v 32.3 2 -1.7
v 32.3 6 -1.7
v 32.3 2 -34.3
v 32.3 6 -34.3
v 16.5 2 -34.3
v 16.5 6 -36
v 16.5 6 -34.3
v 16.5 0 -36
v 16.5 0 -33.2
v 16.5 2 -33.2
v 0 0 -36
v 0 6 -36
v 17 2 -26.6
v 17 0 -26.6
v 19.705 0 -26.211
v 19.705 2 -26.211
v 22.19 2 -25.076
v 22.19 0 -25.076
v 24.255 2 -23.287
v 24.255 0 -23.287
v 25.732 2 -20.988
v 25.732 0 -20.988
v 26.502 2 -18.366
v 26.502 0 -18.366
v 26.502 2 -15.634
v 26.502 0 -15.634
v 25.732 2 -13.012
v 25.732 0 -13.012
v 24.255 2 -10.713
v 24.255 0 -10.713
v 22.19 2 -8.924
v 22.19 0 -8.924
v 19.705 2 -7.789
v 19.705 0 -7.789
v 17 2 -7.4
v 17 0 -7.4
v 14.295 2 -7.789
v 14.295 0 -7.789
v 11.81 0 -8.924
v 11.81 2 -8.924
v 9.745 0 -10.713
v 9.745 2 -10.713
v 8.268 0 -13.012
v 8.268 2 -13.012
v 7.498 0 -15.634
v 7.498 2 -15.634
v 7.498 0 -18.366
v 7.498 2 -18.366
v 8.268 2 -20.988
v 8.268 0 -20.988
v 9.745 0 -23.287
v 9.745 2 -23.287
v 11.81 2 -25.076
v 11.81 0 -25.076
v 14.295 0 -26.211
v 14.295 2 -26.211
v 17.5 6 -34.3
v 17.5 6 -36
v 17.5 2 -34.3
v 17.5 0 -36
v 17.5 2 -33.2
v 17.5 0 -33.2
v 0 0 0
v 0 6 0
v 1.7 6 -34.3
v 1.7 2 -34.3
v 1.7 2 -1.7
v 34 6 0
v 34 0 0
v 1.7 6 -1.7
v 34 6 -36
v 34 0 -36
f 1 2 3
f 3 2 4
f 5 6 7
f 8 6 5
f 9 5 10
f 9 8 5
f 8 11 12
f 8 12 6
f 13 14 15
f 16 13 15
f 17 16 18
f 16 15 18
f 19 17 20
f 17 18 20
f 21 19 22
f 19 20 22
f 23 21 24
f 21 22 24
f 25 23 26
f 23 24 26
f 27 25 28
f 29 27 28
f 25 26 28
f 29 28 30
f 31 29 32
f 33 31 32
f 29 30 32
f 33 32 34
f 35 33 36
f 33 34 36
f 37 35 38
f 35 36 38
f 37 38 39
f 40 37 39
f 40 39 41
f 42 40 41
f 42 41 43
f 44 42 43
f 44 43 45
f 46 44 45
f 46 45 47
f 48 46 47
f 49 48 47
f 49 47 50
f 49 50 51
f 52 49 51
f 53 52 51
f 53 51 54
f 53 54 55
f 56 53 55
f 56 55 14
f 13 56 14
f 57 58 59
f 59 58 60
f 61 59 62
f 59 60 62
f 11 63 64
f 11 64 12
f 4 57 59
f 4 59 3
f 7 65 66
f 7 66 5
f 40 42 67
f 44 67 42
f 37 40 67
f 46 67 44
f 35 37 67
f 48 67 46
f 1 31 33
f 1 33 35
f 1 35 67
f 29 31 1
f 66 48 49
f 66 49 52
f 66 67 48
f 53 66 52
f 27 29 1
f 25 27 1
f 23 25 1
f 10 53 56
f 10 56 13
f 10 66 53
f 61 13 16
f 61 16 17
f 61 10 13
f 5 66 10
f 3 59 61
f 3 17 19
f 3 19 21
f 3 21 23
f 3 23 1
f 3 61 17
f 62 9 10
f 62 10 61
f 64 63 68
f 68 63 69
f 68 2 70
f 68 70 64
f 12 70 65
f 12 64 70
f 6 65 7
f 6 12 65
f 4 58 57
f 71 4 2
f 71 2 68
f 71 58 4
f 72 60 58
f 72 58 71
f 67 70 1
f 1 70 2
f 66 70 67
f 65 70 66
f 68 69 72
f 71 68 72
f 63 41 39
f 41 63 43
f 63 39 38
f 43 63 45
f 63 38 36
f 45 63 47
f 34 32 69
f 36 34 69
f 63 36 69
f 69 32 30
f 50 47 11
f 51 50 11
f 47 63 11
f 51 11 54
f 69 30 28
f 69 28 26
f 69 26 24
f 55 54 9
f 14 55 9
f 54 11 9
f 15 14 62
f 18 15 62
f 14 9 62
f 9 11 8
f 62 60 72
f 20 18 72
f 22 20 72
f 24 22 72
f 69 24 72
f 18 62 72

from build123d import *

# Parameters (mm, degrees)
SKETCH1_W           = 34
SKETCH1_H           = 36
BOSS_EXTRUDE1_DEPTH = 6
SKETCH2_W           = 30.6
SKETCH2_H           = 32.6
CUT_EXTRUDE1_DEPTH  = 4
SKETCH3_R           = 9.6
CUT_EXTRUDE2_DEPTH  = 50.879855653
SKETCH4_W           = 1
SKETCH4_H           = 2.8
CUT_EXTRUDE3_DEPTH  = 50.879855653


with BuildPart() as part:
    # Sketch1 → Boss-Extrude1 (new body)
    with BuildSketch(Plane(origin=(0, 0, 0), x_dir=(1, 0, 0), z_dir=(0, 1, 0))):
        with Locations((17, 18)):
            Rectangle(SKETCH1_W, SKETCH1_H)
    extrude(amount=BOSS_EXTRUDE1_DEPTH)

    # Sketch2 → Cut-Extrude1 (cut)
    with BuildSketch(Plane(origin=(0, 6, 0), x_dir=(1, 0, 0), z_dir=(0, 1, 0))):
        with Locations((17, 18)):
            Rectangle(SKETCH2_W, SKETCH2_H)
    extrude(amount=-CUT_EXTRUDE1_DEPTH, mode=Mode.SUBTRACT)

    # Sketch3 → Cut-Extrude2 (cut, through all)
    with BuildSketch(Plane.XZ):
        with Locations(Location((17, -17, 0), (0, 0, 270))):
            Circle(SKETCH3_R)
    extrude(amount=-CUT_EXTRUDE2_DEPTH, mode=Mode.SUBTRACT)

    # Sketch4 → Cut-Extrude3 (cut, through all)
    with BuildSketch(Plane.XZ):
        with Locations((17, -34.6)):
            Rectangle(SKETCH4_W, SKETCH4_H)
    extrude(amount=-CUT_EXTRUDE3_DEPTH, mode=Mode.SUBTRACT)


solid = part.part
